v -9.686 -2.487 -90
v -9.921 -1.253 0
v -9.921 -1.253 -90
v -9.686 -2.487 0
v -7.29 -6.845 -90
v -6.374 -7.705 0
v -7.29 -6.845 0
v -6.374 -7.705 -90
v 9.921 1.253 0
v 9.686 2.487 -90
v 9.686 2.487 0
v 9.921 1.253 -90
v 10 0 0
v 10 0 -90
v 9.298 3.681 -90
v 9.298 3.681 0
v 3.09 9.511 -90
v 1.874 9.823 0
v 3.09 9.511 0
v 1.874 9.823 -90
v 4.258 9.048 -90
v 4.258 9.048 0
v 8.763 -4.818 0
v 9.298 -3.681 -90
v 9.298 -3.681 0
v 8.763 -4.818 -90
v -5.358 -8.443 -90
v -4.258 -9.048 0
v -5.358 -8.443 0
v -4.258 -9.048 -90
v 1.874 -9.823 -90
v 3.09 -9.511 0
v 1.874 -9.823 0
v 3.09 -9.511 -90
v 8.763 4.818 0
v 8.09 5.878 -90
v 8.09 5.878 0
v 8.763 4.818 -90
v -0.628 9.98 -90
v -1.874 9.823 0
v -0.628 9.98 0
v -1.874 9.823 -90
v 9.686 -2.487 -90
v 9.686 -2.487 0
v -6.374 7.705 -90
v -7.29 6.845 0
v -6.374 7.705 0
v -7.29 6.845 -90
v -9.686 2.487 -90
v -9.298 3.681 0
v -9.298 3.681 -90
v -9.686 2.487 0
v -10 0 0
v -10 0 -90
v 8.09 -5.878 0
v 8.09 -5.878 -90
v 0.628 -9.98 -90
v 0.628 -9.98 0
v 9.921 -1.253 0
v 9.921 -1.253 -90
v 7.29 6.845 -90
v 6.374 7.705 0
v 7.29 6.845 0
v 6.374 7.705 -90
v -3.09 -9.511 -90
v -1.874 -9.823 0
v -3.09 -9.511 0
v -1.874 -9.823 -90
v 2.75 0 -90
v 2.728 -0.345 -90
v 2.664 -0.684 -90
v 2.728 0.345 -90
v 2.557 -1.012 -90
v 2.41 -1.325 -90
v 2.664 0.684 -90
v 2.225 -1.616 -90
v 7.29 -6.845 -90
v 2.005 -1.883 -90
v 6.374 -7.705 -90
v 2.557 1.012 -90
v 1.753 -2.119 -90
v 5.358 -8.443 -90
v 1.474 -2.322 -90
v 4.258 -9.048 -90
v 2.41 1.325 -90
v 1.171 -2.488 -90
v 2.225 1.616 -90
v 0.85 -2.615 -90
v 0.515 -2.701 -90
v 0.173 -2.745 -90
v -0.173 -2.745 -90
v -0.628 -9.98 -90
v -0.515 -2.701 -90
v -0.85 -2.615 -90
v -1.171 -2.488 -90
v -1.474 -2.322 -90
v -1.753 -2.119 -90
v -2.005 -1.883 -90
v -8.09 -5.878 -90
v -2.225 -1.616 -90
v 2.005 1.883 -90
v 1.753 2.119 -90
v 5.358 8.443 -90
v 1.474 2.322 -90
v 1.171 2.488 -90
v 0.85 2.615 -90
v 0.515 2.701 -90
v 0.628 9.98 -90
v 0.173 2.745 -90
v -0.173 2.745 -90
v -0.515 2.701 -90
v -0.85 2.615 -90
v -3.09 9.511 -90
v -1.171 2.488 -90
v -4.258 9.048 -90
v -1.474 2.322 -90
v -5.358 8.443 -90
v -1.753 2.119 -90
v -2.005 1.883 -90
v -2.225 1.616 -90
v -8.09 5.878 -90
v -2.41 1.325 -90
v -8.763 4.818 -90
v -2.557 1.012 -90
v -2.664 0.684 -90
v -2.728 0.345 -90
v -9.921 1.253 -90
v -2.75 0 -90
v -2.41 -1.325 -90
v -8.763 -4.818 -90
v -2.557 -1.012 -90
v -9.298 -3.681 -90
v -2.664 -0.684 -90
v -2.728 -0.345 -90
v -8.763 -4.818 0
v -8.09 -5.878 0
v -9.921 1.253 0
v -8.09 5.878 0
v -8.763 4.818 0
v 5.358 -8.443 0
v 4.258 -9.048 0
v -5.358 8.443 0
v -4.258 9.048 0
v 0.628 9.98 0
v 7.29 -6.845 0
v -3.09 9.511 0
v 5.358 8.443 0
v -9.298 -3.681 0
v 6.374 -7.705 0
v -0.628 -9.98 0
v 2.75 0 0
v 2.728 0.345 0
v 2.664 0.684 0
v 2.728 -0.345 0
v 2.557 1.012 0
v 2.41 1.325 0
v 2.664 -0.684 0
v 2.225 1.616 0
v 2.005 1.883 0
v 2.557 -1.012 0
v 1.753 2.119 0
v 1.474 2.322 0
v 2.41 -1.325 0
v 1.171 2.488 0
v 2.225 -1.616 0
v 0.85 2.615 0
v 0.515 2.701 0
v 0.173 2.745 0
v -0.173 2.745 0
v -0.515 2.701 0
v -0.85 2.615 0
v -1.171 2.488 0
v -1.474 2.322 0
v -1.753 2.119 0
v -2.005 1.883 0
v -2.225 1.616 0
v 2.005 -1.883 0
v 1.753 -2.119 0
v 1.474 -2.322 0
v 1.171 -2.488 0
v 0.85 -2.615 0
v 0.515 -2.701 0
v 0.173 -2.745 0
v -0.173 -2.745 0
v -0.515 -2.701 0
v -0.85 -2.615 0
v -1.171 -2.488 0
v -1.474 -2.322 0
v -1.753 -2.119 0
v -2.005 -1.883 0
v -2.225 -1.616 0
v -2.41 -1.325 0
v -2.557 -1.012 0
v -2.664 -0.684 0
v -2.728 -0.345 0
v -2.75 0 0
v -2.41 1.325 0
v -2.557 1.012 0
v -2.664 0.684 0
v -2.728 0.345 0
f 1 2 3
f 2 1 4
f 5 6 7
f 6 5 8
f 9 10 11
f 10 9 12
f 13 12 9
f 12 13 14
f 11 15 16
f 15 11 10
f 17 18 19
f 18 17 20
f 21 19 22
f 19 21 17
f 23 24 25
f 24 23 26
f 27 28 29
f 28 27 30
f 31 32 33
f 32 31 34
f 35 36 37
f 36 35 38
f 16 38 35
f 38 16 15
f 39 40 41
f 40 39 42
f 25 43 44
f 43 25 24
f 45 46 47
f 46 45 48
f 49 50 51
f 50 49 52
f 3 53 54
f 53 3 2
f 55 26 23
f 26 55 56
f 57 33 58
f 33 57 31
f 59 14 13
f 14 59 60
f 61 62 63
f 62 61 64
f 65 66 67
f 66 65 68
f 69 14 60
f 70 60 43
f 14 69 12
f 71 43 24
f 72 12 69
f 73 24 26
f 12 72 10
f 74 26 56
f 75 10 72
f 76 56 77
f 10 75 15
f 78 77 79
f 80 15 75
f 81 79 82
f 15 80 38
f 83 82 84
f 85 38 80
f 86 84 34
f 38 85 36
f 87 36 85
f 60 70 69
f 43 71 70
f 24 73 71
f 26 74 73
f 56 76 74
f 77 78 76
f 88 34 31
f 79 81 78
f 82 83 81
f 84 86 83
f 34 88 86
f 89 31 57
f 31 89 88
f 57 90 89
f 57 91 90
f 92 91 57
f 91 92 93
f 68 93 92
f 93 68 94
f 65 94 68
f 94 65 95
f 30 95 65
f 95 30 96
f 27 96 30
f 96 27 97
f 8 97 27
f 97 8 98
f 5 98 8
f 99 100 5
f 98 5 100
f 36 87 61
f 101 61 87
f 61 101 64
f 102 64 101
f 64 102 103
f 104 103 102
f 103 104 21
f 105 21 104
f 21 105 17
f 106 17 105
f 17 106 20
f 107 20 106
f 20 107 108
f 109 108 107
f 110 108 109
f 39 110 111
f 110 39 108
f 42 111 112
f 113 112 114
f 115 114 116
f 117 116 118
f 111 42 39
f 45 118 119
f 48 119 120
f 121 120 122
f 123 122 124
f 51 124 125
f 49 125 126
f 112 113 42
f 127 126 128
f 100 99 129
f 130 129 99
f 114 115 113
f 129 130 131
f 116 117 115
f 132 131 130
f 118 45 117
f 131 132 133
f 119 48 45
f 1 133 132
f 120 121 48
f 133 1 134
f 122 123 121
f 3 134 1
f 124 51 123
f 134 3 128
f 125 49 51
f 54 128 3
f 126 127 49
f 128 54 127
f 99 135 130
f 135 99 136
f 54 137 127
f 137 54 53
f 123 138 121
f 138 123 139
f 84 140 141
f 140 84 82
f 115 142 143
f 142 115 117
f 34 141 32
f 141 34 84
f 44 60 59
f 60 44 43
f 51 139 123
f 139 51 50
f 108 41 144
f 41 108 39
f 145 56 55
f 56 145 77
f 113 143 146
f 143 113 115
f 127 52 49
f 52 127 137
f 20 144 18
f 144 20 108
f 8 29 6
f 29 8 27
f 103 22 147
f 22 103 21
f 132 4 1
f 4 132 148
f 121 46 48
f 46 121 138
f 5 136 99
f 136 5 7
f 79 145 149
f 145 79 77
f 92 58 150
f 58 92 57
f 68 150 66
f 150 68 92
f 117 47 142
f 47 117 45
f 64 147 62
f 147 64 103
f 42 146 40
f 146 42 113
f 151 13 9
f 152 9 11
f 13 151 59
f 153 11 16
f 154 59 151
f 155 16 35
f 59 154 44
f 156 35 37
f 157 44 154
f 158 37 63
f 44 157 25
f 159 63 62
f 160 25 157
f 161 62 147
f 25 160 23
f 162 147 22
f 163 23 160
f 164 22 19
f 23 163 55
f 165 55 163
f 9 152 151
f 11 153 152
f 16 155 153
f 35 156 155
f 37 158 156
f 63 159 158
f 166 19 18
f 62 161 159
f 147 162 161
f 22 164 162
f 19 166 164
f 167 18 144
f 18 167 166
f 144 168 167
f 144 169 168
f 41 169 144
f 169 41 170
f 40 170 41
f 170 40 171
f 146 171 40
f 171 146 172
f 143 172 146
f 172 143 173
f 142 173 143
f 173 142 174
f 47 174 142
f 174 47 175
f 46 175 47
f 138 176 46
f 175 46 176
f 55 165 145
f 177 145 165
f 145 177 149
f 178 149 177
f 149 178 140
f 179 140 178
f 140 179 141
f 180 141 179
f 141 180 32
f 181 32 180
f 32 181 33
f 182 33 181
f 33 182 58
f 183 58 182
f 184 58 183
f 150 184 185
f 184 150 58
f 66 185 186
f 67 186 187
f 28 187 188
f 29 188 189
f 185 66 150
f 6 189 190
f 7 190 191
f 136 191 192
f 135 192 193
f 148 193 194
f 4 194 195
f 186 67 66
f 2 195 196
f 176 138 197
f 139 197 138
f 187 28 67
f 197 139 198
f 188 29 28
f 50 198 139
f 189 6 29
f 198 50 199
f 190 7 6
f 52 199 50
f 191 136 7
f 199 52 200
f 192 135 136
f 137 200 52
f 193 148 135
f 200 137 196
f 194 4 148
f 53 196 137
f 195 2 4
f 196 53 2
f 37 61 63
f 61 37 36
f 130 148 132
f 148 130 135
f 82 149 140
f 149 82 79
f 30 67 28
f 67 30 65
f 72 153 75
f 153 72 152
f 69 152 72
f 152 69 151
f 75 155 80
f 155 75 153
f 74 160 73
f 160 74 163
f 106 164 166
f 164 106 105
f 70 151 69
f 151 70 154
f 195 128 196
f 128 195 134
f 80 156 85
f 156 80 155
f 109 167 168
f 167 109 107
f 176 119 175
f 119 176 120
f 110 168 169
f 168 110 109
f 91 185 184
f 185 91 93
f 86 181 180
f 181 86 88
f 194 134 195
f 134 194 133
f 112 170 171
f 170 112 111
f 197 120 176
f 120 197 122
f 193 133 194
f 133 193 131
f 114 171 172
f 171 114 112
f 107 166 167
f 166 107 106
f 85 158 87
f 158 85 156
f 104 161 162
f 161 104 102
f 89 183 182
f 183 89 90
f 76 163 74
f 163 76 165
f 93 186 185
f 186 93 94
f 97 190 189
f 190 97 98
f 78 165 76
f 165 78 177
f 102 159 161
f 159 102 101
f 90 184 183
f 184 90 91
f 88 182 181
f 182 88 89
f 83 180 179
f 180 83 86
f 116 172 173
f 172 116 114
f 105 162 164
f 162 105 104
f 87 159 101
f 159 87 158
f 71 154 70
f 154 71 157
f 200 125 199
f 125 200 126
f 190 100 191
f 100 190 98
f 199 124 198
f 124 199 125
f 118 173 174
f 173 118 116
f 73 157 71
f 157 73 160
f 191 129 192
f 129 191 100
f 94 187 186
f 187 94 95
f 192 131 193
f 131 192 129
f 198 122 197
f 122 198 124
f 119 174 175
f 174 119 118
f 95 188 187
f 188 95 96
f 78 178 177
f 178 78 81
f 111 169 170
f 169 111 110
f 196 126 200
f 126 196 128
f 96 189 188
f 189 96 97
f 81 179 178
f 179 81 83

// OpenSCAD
$fn = 50;


difference() {
	union() {
		translate(v = [0, 0, -90.0000000000]) {
			cylinder(h = 90, r = 10.0000000000);
		}
	}
	union() {
		#translate(v = [0, 0, -90]) {
			cylinder(h = 90, r = 2.7500000000);
		}
	}
}
